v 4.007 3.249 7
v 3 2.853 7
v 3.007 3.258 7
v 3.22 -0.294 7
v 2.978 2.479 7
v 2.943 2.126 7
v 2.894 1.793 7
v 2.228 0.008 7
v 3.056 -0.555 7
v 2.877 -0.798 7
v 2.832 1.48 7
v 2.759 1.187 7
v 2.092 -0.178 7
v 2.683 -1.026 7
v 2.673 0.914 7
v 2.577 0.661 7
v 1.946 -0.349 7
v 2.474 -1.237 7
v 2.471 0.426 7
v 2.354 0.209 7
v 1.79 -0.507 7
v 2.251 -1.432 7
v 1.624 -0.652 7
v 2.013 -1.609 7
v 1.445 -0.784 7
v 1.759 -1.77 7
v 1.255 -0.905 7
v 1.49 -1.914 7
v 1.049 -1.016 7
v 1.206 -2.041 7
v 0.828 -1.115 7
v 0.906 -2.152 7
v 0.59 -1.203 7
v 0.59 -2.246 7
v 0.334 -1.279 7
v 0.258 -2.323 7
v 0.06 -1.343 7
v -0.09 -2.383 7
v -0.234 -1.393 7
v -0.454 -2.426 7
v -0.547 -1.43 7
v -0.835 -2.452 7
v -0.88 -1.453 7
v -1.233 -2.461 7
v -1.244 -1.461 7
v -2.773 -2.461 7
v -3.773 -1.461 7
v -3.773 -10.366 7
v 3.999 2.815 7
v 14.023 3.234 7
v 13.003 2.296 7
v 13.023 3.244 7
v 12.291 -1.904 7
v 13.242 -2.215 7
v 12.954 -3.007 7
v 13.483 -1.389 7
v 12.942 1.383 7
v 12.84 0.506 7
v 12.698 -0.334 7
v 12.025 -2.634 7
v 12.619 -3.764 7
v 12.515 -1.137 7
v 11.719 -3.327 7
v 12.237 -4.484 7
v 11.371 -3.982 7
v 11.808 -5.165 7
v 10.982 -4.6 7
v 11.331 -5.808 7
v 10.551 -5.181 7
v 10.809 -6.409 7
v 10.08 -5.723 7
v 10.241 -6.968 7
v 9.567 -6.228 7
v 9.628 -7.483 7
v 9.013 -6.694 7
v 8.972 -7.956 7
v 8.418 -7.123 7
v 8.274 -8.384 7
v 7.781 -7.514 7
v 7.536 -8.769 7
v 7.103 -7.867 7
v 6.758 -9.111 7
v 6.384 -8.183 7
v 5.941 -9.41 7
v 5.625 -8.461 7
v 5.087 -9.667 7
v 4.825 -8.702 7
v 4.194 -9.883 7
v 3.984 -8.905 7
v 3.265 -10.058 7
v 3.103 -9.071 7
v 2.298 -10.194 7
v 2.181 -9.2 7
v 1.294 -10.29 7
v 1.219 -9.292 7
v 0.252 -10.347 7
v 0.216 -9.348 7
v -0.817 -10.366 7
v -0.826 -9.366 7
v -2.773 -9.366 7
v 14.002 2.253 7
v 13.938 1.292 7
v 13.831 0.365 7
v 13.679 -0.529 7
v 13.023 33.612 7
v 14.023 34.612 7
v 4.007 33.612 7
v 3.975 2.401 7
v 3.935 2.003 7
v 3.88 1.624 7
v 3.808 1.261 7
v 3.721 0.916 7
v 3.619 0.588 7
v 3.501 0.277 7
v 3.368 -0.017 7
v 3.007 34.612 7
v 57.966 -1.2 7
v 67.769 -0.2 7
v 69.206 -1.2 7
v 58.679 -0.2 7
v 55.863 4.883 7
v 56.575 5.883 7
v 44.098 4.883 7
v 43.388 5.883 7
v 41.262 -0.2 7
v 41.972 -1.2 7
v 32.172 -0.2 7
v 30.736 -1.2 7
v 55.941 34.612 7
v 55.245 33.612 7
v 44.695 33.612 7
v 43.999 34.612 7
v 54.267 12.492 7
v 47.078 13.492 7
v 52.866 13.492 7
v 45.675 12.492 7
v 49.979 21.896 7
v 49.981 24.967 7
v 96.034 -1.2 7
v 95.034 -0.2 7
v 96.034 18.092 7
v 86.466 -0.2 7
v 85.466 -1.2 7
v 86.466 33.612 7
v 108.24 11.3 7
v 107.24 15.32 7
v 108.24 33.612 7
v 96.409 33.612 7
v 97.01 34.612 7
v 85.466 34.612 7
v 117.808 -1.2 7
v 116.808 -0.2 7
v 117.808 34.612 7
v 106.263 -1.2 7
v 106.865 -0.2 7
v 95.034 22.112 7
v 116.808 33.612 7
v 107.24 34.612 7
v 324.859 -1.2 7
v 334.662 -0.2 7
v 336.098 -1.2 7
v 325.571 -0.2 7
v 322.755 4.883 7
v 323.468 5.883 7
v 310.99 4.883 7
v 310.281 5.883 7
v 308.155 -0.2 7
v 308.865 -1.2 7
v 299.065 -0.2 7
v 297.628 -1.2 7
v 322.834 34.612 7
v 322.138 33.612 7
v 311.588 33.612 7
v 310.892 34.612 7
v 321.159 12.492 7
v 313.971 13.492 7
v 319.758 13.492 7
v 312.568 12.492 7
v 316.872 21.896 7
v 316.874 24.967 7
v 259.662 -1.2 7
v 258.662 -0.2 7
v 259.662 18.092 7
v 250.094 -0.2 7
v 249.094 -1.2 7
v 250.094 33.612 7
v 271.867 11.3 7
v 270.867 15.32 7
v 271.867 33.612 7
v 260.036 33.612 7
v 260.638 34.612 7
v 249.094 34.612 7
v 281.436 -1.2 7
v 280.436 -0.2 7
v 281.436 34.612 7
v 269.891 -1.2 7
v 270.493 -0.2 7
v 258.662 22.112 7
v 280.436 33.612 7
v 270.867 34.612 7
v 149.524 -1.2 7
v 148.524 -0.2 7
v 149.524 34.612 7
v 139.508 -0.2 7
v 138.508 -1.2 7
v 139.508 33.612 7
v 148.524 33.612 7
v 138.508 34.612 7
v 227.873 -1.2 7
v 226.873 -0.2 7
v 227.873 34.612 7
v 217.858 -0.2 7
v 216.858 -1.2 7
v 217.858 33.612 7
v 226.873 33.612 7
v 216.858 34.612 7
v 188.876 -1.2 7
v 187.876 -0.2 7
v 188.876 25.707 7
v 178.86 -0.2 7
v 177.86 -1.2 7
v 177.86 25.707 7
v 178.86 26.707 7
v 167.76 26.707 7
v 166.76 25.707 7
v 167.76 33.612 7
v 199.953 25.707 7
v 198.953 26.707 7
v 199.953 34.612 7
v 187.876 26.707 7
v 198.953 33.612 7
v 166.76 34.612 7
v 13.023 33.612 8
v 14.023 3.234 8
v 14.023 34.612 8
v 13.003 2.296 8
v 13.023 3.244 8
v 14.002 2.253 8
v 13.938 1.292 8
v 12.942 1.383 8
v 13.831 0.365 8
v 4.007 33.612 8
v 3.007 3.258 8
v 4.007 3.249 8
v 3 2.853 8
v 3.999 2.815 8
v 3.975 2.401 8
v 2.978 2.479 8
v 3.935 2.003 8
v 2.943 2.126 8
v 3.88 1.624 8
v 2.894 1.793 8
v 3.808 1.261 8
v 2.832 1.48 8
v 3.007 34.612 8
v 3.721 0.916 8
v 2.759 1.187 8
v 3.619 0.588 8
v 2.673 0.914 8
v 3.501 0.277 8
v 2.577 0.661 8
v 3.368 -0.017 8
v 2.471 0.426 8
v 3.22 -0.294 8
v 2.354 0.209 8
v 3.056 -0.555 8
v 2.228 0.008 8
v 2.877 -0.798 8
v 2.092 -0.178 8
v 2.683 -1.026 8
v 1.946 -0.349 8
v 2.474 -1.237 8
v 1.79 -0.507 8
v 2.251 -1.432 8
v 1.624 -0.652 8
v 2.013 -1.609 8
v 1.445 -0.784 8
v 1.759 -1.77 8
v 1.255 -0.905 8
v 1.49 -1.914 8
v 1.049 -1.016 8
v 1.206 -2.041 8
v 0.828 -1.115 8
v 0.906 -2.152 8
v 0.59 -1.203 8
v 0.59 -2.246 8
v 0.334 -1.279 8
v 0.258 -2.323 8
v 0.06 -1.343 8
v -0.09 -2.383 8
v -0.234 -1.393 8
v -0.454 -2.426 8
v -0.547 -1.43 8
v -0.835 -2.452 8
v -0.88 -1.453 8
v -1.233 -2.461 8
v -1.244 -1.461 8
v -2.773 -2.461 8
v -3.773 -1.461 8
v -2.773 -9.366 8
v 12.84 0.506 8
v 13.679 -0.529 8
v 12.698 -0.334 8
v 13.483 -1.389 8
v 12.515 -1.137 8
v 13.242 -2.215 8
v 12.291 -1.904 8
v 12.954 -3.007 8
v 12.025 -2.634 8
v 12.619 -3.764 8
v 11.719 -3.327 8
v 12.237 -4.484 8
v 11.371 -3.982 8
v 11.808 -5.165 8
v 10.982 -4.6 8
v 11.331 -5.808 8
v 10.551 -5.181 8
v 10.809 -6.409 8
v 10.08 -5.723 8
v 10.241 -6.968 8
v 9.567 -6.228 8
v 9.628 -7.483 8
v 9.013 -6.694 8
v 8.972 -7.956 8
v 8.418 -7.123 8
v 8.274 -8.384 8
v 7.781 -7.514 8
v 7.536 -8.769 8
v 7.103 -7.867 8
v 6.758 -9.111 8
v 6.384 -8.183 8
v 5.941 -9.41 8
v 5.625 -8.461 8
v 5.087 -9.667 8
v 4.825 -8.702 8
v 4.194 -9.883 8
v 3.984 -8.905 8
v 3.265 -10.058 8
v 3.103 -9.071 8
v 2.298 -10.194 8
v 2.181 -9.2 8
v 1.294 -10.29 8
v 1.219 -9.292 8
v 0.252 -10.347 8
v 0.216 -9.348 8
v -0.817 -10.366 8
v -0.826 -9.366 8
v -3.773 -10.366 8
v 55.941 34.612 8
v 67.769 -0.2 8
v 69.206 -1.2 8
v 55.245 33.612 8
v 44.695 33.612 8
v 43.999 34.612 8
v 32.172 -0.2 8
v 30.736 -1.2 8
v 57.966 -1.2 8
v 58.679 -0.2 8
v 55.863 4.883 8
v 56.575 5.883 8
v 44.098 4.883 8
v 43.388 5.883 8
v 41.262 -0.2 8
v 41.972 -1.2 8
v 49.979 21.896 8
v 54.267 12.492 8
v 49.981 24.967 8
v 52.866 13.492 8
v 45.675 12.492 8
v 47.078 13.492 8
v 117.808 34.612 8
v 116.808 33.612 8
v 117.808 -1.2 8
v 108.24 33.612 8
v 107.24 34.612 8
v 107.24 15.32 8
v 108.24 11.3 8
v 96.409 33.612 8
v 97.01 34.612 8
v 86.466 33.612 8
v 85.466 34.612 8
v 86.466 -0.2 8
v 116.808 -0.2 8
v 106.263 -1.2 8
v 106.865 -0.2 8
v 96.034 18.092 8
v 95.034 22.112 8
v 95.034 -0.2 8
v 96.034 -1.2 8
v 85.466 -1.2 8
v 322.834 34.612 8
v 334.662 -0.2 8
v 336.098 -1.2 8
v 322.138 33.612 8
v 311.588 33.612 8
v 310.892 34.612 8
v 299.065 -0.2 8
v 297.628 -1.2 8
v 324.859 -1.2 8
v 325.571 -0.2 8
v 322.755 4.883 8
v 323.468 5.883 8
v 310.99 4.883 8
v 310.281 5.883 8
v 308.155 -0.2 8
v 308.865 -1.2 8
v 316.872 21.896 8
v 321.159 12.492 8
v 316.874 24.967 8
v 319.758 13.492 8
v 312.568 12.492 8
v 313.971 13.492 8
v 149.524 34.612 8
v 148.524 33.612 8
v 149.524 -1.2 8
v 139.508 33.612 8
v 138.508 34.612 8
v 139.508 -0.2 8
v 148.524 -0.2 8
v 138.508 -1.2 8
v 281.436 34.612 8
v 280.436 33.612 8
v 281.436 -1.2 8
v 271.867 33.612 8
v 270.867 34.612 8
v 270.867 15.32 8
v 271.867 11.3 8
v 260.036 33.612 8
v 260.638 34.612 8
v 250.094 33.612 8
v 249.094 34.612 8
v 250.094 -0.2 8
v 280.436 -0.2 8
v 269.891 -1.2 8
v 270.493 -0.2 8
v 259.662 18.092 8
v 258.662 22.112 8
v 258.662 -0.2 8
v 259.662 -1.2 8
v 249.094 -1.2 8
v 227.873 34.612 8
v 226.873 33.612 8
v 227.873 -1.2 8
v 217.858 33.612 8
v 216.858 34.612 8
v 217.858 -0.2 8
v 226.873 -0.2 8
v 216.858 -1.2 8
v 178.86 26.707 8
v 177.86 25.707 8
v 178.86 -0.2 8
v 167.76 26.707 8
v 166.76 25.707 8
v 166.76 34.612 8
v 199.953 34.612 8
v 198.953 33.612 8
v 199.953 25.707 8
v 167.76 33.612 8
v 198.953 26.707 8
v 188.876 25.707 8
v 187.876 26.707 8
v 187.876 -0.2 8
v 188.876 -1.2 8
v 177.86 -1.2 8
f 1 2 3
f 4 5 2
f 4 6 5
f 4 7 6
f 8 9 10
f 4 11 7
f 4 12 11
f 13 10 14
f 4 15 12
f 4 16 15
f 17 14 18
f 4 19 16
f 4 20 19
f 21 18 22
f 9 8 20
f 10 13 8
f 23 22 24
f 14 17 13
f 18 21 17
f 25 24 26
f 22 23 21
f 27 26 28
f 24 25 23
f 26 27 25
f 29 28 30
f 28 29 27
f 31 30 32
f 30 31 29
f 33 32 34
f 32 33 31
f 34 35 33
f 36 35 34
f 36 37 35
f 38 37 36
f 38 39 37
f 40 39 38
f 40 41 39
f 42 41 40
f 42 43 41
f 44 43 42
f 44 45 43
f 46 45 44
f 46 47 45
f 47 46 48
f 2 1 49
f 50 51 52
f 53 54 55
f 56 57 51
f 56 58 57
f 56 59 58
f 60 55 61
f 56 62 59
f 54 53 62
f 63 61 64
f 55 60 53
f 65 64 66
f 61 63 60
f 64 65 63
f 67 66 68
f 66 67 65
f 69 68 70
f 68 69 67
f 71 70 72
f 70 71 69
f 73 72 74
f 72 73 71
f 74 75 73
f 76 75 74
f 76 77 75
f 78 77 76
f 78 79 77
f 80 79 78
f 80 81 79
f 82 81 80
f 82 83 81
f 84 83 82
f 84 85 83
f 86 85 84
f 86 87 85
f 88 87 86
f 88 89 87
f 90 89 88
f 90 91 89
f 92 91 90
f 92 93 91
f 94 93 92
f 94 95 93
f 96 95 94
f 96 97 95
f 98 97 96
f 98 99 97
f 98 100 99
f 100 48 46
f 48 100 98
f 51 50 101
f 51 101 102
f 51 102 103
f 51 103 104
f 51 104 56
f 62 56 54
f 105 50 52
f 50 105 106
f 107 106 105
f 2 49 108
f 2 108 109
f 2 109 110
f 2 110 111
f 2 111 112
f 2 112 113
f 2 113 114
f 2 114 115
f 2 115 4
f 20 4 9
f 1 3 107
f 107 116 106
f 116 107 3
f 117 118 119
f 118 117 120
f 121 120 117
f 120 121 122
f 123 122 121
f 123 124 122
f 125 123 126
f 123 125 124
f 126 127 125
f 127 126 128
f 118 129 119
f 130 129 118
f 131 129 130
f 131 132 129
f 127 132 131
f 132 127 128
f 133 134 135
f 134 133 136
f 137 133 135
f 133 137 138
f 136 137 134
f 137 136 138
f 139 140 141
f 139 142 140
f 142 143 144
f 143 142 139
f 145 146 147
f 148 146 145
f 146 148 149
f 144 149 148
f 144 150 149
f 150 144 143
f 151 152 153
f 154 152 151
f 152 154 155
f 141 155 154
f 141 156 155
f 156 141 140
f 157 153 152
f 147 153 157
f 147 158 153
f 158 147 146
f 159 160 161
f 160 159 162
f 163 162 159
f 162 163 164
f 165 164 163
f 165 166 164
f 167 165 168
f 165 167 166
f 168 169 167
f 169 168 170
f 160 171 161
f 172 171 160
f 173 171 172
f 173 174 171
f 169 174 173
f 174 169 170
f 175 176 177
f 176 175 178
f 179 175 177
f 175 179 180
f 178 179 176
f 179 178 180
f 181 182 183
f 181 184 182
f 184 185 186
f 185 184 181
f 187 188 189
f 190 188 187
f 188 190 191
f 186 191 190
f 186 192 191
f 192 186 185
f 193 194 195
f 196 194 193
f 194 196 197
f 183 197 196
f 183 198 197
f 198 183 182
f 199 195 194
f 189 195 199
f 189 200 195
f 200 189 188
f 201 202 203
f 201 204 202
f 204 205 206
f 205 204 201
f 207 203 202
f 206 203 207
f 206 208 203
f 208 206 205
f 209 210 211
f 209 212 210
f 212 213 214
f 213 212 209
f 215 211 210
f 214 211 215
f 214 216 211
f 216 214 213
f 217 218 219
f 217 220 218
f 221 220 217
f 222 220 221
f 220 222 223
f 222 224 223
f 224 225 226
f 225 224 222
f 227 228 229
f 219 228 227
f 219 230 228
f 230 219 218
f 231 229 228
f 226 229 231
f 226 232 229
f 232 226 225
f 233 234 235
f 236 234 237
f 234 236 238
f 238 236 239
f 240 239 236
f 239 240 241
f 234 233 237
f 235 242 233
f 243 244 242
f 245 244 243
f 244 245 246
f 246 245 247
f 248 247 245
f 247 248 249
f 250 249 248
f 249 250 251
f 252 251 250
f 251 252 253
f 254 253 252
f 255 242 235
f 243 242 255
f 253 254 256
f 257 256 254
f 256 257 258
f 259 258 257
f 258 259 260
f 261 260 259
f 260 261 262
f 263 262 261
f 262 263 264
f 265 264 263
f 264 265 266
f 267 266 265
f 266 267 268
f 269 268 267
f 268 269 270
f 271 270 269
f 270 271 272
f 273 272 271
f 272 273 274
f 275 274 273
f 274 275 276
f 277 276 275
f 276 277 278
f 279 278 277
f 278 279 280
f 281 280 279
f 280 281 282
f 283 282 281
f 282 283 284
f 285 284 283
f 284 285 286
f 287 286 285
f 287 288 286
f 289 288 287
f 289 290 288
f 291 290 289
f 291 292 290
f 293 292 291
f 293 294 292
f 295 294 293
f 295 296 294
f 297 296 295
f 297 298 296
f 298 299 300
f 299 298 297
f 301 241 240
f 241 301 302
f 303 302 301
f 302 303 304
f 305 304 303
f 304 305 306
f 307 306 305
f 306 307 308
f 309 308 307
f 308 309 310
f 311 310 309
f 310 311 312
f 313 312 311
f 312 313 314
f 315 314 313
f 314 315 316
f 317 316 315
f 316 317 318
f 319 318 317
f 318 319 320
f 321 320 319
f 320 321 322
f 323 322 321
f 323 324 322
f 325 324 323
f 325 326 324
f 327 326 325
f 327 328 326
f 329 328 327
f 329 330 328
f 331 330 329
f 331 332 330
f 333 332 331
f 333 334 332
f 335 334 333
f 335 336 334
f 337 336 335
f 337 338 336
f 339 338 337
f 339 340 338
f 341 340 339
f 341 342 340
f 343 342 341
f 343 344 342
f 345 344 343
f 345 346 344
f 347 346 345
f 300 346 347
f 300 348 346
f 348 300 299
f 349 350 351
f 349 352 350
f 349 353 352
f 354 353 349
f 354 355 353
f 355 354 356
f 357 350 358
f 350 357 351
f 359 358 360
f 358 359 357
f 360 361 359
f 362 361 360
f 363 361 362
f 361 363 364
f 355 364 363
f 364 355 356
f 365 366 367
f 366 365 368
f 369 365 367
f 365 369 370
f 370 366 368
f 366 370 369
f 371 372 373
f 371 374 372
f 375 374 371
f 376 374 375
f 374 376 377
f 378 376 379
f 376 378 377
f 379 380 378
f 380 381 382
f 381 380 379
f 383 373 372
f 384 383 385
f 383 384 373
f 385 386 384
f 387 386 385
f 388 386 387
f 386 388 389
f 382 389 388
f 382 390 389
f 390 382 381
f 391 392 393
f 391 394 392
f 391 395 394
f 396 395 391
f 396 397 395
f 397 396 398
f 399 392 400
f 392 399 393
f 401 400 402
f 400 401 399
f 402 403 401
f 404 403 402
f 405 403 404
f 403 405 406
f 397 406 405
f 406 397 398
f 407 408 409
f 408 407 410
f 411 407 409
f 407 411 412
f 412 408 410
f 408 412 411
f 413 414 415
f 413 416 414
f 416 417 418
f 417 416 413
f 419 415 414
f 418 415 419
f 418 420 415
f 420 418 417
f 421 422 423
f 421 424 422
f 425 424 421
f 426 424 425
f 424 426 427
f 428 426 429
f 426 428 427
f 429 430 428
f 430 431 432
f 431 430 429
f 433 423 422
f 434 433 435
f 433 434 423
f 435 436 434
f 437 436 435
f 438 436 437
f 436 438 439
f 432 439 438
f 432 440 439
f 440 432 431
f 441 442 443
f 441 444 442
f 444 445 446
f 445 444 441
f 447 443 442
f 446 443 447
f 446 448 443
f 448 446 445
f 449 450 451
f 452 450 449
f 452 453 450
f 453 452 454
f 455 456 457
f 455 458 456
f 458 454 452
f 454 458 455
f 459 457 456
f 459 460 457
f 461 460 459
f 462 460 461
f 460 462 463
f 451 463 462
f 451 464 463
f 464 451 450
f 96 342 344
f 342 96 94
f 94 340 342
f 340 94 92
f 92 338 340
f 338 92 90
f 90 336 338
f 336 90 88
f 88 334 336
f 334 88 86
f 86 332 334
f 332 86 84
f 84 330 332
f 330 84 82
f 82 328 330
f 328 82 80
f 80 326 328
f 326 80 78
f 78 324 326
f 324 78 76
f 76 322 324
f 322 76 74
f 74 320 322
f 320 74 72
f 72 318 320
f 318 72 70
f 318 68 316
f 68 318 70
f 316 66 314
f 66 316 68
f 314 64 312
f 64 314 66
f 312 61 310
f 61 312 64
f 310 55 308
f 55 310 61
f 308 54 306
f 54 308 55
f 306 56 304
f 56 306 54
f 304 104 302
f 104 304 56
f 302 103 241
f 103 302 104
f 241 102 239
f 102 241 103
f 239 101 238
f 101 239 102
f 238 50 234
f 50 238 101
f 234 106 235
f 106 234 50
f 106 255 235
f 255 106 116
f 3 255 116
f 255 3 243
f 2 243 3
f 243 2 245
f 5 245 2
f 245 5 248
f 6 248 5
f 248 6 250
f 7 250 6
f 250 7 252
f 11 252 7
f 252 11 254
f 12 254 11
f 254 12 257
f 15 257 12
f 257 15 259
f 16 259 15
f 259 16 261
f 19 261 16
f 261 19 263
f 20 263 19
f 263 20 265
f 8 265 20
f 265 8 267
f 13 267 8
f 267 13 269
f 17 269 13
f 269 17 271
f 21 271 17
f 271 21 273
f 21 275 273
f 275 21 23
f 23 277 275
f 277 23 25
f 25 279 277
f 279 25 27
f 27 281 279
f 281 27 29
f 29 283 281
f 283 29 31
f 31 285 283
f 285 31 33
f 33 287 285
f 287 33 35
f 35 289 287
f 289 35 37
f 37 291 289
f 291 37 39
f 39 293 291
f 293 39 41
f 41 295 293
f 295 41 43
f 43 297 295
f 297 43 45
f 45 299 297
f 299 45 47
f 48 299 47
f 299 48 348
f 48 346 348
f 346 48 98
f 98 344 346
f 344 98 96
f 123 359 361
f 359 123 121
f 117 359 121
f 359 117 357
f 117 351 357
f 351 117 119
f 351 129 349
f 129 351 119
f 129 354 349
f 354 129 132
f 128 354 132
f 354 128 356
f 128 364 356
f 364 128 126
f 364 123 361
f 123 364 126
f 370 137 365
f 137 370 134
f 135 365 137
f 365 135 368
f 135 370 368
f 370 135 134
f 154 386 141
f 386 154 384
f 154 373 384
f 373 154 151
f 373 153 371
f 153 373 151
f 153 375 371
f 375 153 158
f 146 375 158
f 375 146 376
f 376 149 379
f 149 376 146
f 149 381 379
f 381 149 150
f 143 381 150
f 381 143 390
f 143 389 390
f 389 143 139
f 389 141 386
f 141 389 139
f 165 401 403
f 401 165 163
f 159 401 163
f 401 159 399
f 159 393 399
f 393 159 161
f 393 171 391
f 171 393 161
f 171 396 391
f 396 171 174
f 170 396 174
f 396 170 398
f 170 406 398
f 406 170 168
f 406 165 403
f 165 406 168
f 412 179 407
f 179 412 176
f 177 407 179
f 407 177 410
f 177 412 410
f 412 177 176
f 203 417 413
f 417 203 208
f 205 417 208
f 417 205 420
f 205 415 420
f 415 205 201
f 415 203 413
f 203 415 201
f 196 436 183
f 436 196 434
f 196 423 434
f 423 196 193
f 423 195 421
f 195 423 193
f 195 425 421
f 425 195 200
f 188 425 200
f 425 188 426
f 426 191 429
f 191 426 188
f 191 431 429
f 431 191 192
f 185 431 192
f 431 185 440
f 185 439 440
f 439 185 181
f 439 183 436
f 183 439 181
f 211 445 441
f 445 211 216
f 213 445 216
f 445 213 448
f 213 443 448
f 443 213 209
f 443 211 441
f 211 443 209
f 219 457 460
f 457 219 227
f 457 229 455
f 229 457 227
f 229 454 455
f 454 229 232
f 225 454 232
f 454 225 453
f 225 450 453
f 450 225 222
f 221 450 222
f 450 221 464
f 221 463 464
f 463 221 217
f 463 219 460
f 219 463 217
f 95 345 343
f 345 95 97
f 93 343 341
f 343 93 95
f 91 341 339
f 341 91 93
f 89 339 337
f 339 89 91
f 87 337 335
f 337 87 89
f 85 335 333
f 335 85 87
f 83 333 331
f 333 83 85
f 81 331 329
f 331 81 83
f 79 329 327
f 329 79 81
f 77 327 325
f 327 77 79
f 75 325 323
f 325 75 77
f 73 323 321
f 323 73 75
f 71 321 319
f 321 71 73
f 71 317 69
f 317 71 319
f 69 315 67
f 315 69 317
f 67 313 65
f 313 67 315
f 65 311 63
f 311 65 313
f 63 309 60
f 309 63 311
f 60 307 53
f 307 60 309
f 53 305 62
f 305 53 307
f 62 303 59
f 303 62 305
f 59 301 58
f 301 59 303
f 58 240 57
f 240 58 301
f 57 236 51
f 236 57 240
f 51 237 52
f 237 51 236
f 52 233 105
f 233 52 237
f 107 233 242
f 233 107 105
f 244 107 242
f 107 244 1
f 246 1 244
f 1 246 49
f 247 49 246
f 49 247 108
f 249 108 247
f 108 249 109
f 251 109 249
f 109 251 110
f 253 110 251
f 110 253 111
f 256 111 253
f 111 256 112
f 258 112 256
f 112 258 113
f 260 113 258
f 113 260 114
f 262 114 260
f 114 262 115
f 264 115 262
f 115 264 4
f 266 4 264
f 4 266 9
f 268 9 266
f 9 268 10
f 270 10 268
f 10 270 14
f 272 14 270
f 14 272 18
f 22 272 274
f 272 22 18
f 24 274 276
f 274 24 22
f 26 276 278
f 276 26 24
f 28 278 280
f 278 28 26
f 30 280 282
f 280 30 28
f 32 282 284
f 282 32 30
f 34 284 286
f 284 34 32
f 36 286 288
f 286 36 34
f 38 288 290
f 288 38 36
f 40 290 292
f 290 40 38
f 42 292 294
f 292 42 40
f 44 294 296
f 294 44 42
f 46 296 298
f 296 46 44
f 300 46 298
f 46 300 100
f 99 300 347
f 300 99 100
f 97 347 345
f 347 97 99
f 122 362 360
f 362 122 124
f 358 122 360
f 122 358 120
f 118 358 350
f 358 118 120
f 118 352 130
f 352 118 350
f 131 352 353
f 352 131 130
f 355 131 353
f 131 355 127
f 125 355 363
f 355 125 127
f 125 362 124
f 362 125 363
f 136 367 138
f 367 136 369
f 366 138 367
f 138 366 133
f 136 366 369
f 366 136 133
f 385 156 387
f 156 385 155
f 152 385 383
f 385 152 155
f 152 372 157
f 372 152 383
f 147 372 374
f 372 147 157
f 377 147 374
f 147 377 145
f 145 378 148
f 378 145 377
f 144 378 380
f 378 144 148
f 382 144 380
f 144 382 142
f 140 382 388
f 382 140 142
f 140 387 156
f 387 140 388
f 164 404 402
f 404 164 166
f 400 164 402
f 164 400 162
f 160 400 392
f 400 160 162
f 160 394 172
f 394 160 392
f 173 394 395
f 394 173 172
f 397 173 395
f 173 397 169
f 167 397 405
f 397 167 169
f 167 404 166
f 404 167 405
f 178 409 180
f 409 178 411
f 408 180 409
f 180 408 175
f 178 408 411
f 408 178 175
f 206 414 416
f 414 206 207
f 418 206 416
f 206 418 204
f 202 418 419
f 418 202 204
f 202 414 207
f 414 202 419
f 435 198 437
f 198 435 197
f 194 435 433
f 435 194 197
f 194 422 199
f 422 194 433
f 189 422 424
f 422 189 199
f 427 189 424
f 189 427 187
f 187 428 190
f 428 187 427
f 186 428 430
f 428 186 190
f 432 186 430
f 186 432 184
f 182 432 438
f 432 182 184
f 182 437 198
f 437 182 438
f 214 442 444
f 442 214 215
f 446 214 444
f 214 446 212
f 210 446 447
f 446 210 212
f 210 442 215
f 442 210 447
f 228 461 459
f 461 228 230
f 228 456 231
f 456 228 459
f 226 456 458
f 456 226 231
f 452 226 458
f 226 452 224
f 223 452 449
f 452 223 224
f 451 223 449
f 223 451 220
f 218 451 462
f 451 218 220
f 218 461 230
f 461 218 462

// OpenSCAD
text = "J A N I T I N A";
size = 33;
font = "Sans";

hole_locations = [
  [7.5, 10.75],
  [42.3, 10.75],
  [87.8, 16],
  [126, 16],
  [159.5, 16],
  [192.7, 16],
  [231.5, 16],
  [276.5, 10.75],
];

font_spec = str(font, ":style=Bold");
echo(font_spec);

color("black") {
  translate([0, 0, 7]) {
    difference() {
      linear_extrude(1) {
        offset(delta = 1.2)
          text(text, 33, font = font_spec, $fn = 100);
      }
      linear_extrude(2) {
        offset(delta = 0.2)
          text(text, 33, font = font_spec, $fn = 100);
      }
    }
  }
}
